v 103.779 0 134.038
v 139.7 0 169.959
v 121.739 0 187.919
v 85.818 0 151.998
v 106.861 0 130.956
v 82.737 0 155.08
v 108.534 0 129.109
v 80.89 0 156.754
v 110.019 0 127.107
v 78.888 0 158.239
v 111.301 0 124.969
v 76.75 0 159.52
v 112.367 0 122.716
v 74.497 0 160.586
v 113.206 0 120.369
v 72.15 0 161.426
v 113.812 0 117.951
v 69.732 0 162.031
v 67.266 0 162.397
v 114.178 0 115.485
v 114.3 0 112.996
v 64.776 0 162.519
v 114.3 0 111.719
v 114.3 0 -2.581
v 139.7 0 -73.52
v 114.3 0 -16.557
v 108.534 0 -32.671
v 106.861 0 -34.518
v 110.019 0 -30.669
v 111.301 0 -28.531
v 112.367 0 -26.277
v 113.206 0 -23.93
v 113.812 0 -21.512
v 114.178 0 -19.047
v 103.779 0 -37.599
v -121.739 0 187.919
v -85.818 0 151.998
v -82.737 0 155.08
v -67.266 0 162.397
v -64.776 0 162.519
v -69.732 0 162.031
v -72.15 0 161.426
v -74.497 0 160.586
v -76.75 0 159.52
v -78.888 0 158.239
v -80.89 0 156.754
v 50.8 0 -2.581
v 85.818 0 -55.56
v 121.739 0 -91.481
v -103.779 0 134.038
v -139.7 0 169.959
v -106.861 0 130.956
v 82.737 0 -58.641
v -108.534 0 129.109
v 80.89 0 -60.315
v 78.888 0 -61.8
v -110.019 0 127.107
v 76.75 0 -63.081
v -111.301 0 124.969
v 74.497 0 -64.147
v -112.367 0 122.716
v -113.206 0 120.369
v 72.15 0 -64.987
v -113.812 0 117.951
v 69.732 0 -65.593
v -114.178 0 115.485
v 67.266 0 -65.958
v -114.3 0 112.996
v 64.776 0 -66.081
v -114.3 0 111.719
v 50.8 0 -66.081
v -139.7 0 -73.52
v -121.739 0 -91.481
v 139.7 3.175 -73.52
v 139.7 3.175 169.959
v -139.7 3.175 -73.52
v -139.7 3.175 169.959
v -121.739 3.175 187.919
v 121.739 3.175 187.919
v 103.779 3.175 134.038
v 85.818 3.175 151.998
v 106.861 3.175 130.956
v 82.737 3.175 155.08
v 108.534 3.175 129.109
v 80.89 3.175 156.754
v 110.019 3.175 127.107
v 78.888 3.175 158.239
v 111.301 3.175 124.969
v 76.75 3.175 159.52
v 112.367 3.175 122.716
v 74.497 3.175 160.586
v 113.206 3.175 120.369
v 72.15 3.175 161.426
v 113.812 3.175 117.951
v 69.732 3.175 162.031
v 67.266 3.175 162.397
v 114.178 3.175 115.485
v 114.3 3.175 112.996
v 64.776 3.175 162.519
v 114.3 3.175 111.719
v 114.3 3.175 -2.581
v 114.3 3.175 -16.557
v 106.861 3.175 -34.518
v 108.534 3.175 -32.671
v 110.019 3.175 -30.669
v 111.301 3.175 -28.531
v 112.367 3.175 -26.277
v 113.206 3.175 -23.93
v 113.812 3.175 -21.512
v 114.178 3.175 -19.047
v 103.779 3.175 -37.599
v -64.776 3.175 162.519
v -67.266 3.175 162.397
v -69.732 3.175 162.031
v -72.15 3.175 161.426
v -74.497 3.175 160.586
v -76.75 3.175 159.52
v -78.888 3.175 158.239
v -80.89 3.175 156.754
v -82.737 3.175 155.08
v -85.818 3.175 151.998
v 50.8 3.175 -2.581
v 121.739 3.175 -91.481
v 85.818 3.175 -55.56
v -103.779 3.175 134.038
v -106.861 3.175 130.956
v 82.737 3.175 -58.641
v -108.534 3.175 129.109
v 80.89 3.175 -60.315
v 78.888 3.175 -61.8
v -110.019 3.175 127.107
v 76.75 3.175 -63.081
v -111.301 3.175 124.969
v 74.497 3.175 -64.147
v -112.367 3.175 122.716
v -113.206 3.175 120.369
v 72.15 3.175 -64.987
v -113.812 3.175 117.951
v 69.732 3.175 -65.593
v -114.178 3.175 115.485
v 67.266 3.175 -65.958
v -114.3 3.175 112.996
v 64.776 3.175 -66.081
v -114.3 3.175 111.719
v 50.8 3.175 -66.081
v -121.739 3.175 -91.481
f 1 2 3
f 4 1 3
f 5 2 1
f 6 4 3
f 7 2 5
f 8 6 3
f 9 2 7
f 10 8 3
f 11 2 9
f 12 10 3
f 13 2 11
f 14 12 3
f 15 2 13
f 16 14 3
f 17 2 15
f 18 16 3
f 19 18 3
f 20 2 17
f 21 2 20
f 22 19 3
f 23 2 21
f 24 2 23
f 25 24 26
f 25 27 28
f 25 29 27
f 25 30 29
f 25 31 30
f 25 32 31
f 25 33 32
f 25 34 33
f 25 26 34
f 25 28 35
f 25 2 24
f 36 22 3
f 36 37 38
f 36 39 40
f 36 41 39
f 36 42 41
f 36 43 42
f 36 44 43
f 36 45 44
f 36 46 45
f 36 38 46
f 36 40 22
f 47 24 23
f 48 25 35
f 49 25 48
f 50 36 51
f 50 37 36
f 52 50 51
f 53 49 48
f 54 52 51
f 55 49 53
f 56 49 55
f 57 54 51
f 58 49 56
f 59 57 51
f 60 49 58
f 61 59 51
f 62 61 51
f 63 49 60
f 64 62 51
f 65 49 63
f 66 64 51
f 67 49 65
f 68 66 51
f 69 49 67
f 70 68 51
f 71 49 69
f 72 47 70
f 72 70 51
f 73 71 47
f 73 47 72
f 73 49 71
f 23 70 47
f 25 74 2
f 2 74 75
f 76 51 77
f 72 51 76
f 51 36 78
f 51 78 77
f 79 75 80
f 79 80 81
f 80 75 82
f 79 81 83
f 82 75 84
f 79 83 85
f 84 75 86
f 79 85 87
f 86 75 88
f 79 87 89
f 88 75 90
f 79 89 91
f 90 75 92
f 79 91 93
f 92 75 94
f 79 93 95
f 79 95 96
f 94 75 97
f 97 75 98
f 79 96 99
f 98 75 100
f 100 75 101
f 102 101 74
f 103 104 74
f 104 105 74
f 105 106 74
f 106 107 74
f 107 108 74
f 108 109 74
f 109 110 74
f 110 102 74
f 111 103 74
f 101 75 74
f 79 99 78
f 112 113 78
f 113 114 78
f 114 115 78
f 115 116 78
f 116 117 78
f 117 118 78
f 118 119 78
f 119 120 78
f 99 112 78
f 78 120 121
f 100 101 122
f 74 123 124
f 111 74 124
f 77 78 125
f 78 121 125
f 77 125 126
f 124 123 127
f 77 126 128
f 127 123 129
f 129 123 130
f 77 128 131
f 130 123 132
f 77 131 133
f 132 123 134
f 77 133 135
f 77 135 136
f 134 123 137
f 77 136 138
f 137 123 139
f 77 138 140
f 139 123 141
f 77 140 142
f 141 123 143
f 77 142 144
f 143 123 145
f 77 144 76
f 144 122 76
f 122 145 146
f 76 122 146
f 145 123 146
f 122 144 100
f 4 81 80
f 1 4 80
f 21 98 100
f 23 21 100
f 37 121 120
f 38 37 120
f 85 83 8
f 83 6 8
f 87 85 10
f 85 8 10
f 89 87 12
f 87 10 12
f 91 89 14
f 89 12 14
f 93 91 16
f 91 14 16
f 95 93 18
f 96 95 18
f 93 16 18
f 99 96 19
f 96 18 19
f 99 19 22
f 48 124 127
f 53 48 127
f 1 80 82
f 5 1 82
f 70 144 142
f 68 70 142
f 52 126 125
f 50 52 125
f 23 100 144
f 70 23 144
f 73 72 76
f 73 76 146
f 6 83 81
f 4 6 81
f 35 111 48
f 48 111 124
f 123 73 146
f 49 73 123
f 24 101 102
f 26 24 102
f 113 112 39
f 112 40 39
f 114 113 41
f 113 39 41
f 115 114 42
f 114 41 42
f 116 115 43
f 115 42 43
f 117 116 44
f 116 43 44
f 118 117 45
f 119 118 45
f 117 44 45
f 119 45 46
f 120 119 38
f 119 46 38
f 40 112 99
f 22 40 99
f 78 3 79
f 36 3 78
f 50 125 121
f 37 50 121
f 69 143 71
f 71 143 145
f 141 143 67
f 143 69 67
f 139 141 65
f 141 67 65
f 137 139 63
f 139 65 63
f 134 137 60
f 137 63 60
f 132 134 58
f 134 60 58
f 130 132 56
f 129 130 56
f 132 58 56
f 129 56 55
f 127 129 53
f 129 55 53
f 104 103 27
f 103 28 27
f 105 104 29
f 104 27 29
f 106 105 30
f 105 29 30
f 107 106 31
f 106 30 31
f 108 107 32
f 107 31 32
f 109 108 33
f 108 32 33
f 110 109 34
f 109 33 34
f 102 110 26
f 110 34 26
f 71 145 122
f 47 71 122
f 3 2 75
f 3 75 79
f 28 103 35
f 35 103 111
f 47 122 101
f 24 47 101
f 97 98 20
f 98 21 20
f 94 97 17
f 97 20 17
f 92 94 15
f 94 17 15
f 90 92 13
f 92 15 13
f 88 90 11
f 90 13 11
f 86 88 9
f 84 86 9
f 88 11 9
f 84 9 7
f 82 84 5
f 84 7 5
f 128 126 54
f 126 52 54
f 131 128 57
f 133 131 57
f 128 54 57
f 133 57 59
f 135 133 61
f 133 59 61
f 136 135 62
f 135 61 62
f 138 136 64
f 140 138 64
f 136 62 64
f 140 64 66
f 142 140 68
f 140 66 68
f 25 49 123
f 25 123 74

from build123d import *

# Parameters (mm, degrees)
BOSS_EXTRUDE1_DEPTH = 3.175
CUT_EXTRUDE4_DEPTH  = 235.179100055
FILLET1_R           = 25.4
BOSS_EXTRUDE2_DEPTH = 3.175


with BuildPart() as part:
    # Sketch1 → Boss-Extrude1 (new body)
    with BuildSketch(Plane(origin=(0, 0, 0), x_dir=(1, 0, 0), z_dir=(0, 1, 0))):
        Polygon((-139.7, 73.520142619), (-121.739487758, 91.480654861), (121.739487758, 91.480654861), (139.7, 73.520142619), (139.7, -169.958832897), (121.739487758, -187.919345139), (-121.739487758, -187.919345139), (-139.7, -169.958832897), align=None)
    extrude(amount=BOSS_EXTRUDE1_DEPTH)

    # Sketch2 → Cut-Extrude4 (cut, through all)
    with BuildSketch(Plane(origin=(0, 3.175, 0), x_dir=(1, 0, 0), z_dir=(0, 1, 0))):
        Polygon((-103.778975516, 37.599118134), (-114.3, 27.07809365), (-114.3, -123.516783928), (-103.778975516, -134.037808413), (-85.818463274, -151.998320655), (-75.297438789, -162.519345139), (75.297438789, -162.519345139), (85.818463274, -151.998320655), (103.778975516, -134.037808413), (114.3, -123.516783928), (114.3, 27.07809365), (103.778975516, 37.599118134), (85.818463274, 55.559630377), (75.297438789, 66.080654861), (-75.297438789, 66.080654861), (-85.818463274, 55.559630377), align=None)
    extrude(amount=-CUT_EXTRUDE4_DEPTH, mode=Mode.SUBTRACT)

    # Fillet1
    fillet1_edges = [part.edges().sort_by_distance(p)[0] for p in [
        (-75.297438789, 1.5875, -66.080654861),
        (75.297438789, 1.5875, -66.080654861),
        (114.3, 1.5875, -27.07809365),
        (114.3, 1.5875, 123.516783928),
        (75.297438789, 1.5875, 162.519345139),
        (-75.297438789, 1.5875, 162.519345139),
        (-114.3, 1.5875, 123.516783928),
        (-114.3, 1.5875, -27.07809365),
    ]]
    fillet(fillet1_edges, radius=FILLET1_R)

    # Sketch6 → Boss-Extrude2 (add)
    with BuildSketch(Plane(origin=(0, 3.175, 0), x_dir=(1, 0, 0), z_dir=(0, 1, 0))):
        Polygon((50.8, 2.580654861), (139.7, 2.580654861), (139.7, -111.719345139), (-139.7, -111.719345139), (-139.7, 2.580654861), (-139.7, 73.520142619), (50.8, 73.520142619), align=None)
    extrude(amount=-BOSS_EXTRUDE2_DEPTH)


solid = part.part
